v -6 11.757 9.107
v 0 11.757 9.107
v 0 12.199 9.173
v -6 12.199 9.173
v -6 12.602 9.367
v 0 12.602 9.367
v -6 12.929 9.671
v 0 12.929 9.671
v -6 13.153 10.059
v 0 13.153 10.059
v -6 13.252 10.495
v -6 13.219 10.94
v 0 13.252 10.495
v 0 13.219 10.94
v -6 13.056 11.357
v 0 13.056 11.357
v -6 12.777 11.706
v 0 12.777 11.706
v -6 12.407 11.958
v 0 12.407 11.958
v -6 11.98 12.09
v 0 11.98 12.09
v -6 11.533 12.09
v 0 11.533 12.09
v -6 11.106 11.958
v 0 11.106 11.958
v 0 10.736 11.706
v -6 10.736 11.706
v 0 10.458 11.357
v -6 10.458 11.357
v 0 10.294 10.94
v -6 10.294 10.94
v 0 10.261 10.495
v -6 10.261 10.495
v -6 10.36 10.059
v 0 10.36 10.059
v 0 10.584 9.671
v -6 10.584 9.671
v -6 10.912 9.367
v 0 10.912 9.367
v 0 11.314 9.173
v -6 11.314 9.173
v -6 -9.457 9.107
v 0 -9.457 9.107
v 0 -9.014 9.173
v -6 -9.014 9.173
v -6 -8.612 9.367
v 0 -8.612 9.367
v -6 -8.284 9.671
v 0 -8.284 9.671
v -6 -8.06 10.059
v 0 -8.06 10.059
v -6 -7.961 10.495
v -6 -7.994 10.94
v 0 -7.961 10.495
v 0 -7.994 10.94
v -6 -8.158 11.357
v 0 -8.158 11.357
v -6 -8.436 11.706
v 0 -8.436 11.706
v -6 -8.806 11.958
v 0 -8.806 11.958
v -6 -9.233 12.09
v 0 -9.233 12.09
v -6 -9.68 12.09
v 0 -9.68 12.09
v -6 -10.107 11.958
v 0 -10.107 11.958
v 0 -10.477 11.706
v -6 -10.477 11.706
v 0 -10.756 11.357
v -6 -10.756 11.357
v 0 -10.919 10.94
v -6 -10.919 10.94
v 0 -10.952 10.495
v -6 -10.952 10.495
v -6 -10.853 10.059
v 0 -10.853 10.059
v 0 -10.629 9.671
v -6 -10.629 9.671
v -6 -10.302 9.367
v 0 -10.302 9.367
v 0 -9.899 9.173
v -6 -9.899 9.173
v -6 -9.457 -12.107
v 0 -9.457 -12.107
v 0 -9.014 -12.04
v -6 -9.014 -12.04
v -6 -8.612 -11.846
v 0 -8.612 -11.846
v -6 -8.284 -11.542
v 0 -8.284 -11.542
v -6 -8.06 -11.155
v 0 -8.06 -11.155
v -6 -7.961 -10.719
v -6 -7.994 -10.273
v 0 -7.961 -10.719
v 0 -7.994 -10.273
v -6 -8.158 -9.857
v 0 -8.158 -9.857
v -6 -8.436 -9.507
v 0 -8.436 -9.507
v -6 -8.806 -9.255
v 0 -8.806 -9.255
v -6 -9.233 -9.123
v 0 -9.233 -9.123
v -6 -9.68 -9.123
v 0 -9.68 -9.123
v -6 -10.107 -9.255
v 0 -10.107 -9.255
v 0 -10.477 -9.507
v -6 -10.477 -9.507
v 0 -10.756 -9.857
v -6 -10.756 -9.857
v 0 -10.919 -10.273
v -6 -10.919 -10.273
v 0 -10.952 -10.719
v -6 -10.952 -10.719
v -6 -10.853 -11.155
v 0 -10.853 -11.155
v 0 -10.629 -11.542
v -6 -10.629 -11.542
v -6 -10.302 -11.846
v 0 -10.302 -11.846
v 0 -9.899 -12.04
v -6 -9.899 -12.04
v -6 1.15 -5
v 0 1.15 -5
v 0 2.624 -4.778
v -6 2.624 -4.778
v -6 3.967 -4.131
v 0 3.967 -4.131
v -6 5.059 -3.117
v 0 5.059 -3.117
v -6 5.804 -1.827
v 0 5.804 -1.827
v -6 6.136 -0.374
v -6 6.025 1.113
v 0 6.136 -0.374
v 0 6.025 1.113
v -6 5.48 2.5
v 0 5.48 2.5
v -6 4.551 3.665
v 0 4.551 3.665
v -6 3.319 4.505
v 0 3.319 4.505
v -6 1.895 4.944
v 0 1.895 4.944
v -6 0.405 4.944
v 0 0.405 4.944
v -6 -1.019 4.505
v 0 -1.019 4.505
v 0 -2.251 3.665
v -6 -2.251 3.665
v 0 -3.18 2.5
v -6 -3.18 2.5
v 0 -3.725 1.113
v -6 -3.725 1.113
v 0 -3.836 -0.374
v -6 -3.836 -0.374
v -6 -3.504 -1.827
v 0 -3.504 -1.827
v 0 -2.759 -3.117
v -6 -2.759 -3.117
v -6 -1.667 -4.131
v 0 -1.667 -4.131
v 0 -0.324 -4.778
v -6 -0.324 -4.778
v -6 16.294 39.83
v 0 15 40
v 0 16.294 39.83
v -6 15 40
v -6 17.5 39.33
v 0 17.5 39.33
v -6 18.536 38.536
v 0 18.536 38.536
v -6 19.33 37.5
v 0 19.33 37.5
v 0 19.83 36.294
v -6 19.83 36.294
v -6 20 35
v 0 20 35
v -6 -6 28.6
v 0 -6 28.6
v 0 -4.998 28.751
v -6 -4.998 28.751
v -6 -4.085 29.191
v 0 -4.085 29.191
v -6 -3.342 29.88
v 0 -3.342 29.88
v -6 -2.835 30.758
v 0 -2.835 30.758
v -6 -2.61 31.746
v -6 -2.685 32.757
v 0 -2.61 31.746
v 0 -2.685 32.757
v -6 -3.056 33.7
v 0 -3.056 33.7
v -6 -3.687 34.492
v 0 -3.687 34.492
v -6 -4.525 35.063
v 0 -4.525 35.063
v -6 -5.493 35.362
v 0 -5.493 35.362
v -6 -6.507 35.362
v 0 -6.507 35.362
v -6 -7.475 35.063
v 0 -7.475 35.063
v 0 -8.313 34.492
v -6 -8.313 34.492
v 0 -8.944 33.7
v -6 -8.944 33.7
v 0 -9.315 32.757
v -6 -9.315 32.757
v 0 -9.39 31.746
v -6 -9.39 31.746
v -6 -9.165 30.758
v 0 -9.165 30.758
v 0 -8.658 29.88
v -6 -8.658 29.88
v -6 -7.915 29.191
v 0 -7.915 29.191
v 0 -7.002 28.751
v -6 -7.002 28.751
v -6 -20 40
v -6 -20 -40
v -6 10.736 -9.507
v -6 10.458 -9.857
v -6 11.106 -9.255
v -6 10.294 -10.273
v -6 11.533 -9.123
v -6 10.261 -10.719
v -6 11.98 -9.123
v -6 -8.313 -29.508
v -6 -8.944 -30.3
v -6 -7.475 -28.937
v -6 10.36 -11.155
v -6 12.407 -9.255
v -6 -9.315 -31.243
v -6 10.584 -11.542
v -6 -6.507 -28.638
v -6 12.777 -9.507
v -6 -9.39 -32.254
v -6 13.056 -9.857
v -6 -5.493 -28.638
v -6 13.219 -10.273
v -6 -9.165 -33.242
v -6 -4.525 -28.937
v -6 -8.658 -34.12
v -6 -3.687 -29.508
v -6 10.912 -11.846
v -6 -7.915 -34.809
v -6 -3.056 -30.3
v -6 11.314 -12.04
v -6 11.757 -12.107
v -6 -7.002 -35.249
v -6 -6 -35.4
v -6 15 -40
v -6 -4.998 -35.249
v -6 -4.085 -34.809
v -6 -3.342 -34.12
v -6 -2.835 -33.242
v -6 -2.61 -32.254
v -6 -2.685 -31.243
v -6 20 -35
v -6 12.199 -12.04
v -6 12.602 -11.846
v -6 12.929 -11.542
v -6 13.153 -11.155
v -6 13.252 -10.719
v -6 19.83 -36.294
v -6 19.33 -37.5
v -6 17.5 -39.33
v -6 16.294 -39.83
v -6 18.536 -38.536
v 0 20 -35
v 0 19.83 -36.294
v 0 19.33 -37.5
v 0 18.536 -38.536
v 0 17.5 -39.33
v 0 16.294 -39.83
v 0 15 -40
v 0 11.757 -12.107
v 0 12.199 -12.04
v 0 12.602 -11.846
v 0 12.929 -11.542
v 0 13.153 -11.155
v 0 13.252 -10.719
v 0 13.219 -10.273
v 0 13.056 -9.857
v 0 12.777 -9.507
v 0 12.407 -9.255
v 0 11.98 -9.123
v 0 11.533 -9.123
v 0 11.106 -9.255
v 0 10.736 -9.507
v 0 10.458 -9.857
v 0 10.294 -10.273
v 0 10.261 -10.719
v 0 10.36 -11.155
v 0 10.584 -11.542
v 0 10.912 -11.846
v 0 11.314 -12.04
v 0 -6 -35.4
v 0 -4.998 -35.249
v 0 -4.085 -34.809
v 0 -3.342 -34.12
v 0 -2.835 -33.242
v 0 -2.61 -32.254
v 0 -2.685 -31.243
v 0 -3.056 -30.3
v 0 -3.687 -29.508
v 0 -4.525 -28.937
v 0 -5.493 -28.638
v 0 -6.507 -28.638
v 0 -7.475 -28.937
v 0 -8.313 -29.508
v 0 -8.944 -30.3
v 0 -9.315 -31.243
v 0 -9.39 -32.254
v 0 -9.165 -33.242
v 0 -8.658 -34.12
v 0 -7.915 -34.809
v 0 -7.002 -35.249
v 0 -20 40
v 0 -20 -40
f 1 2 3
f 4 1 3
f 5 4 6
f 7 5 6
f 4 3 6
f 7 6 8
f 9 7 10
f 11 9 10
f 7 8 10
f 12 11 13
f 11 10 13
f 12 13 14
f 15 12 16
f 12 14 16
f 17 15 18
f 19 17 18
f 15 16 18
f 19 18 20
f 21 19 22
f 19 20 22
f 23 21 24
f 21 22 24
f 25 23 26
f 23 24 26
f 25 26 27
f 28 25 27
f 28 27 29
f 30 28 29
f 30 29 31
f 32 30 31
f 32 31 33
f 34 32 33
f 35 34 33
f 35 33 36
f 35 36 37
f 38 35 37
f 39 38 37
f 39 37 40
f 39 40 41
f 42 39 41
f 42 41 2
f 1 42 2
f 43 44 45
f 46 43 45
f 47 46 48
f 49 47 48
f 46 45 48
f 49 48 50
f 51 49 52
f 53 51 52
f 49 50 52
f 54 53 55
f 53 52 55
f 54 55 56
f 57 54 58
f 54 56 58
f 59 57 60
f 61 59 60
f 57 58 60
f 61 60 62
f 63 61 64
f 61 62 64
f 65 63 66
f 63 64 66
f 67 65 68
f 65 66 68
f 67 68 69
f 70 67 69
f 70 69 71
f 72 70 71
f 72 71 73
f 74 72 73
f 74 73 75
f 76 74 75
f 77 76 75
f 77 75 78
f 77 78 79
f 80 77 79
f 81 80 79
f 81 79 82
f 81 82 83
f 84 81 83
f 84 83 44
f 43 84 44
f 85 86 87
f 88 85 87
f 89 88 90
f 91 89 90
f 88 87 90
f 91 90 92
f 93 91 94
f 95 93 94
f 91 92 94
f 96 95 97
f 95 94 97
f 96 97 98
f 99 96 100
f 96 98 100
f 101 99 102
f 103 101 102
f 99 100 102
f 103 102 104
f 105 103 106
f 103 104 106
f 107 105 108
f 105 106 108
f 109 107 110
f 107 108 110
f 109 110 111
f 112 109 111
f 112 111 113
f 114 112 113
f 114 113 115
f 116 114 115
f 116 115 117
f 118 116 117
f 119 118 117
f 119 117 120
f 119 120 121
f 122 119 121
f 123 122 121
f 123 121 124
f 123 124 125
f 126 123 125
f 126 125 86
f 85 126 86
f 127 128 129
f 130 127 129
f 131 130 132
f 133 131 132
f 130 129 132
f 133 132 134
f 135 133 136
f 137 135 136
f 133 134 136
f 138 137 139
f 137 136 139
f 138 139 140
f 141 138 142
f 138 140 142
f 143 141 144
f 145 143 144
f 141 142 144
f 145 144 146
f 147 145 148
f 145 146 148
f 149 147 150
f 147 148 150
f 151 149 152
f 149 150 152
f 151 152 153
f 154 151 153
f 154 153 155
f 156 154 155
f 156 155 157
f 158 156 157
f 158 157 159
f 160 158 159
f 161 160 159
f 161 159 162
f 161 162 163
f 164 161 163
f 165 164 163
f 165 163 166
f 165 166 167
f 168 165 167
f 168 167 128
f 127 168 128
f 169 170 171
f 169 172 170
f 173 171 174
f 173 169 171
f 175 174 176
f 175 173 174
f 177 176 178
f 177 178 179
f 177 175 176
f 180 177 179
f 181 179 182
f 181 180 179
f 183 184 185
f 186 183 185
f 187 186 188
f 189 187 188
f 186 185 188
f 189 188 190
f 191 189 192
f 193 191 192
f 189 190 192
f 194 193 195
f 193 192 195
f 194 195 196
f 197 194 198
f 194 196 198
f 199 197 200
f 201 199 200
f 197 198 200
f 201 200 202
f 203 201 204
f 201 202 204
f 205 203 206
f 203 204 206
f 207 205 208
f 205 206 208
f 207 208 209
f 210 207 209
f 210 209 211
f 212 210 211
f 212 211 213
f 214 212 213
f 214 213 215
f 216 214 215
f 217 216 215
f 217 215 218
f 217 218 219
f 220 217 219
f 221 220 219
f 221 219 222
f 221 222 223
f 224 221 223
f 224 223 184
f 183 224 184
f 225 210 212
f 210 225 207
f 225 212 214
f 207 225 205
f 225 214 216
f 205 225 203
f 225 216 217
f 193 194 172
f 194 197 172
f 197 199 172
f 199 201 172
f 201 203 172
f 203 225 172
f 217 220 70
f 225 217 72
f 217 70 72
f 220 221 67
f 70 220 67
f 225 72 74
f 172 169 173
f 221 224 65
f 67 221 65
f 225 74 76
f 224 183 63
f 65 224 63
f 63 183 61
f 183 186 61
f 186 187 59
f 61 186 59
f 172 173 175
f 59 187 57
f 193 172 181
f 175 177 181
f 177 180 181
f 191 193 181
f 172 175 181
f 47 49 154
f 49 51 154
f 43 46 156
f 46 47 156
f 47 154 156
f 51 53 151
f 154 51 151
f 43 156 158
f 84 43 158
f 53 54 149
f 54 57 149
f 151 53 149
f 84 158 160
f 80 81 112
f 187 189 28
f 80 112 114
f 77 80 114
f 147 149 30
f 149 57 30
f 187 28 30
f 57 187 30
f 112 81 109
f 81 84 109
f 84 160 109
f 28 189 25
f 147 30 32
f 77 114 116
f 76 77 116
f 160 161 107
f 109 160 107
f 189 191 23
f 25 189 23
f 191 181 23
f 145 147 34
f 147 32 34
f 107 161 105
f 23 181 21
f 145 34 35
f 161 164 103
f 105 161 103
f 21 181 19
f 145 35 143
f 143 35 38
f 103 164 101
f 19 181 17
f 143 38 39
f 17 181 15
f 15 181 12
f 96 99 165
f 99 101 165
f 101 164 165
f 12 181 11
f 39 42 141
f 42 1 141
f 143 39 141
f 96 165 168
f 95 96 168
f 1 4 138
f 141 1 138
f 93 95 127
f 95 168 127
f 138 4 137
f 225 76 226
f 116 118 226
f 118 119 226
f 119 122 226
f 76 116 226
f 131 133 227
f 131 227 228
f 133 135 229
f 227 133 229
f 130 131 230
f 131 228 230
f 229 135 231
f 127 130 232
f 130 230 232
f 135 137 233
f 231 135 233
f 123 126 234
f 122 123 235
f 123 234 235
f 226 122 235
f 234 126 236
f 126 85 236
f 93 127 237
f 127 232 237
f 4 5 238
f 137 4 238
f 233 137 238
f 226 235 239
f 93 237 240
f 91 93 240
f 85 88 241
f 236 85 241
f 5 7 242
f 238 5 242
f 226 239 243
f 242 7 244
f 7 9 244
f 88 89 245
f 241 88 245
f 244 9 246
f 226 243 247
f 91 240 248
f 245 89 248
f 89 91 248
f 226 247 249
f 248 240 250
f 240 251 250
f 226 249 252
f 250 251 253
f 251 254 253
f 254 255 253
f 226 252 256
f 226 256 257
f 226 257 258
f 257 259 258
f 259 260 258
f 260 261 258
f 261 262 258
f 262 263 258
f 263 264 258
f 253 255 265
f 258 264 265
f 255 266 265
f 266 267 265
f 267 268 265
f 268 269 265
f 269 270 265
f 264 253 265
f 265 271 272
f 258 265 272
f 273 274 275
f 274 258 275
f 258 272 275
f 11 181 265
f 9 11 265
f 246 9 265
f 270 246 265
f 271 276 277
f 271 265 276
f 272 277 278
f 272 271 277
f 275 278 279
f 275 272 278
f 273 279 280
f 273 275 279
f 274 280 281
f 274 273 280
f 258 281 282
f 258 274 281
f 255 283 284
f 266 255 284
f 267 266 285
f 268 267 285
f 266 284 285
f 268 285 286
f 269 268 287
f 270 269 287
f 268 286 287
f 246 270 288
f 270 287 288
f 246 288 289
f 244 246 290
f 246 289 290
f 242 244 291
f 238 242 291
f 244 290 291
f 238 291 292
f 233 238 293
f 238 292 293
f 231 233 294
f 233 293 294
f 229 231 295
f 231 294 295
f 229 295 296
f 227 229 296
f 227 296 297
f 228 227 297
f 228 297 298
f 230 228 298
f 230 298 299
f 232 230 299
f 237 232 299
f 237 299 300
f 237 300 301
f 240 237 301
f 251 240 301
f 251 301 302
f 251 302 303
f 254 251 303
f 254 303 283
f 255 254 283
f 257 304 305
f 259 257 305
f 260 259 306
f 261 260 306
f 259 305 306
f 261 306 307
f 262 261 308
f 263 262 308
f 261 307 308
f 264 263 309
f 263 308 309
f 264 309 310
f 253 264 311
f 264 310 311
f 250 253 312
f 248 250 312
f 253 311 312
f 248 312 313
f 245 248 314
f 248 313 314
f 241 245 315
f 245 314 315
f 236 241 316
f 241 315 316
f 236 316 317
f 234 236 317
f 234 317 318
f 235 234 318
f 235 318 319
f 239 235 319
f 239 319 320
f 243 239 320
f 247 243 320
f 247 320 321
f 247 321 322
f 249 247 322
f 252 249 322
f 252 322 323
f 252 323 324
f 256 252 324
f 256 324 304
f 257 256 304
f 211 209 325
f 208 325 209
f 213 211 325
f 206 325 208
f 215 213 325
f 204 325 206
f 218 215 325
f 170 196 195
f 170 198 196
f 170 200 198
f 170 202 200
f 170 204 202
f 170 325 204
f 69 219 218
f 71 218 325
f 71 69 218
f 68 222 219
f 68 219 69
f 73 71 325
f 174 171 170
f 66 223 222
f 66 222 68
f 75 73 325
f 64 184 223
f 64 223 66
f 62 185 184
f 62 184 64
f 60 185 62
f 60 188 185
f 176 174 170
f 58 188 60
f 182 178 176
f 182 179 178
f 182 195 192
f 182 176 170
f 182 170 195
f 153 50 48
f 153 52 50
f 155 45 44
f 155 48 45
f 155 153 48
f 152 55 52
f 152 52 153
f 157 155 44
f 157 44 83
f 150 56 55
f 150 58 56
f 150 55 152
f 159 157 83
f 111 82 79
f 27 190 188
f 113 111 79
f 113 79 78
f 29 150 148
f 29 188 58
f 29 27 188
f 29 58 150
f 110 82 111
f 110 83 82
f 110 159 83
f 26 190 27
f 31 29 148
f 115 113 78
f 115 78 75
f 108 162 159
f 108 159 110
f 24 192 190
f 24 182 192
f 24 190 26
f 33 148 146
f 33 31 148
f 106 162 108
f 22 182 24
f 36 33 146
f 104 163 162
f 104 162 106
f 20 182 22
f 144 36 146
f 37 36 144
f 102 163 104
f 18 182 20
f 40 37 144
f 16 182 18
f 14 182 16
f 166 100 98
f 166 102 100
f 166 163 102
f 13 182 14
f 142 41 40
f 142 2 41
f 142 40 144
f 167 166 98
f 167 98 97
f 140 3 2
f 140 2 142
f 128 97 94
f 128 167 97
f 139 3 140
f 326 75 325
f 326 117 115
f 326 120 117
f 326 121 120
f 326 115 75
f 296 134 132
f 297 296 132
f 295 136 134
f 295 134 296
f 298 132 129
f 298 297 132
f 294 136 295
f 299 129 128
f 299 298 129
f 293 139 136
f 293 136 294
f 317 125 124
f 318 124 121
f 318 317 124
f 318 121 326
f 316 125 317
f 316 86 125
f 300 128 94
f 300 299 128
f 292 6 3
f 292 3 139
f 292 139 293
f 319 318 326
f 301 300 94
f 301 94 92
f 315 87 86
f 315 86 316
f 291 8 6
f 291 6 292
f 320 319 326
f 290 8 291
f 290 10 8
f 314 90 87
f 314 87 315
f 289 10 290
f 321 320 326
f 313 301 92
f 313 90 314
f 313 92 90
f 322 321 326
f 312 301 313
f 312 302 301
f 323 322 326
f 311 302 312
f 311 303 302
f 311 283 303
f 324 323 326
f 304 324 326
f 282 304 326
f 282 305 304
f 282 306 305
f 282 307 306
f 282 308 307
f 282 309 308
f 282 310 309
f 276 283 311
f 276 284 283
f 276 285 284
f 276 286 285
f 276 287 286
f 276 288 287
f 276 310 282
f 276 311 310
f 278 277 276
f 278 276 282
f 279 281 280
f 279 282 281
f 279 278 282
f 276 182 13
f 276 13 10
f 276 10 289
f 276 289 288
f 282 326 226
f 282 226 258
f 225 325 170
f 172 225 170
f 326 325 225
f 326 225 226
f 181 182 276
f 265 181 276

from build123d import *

# Parameters (mm, degrees)
SKETCH3_W           = 80
SKETCH3_H           = 40
BOSS_EXTRUDE3_DEPTH = 6
SKETCH4_R           = 5
SKETCH4_R_2         = 1.5
SKETCH4_R_3         = 3.4
CUT_EXTRUDE1_DEPTH  = 8
FILLET1_R           = 5


with BuildPart() as part:
    # Sketch3 → Boss-Extrude3 (new body)
    with BuildSketch(Plane(origin=(0, 0, 0), x_dir=(0, 0, -1), z_dir=(1, 0, 0))):
        Rectangle(SKETCH3_W, SKETCH3_H)
    extrude(amount=-BOSS_EXTRUDE3_DEPTH)

    # Sketch4 → Cut-Extrude1 (cut)
    with BuildSketch(Plane(origin=(0, 0, 0), x_dir=(0, 0, -1), z_dir=(1, 0, 0))):
        with Locations((0, 1.15)):
            Circle(SKETCH4_R)
        with Locations((-10.606601718, 11.756601718)):
            Circle(SKETCH4_R_2)
        with Locations((10.606601718, 11.756601718)):
            Circle(SKETCH4_R_2)
        with Locations((10.606601718, -9.456601718)):
            Circle(SKETCH4_R_2)
        with Locations((-10.606601718, -9.456601718)):
            Circle(SKETCH4_R_2)
        with Locations((32, -6)):
            Circle(SKETCH4_R_3)
        with Locations((-32, -6)):
            Circle(SKETCH4_R_3)
    extrude(amount=-CUT_EXTRUDE1_DEPTH, mode=Mode.SUBTRACT)

    # Fillet1
    fillet1_edges = [part.edges().sort_by_distance(p)[0] for p in [
        (-3, 20, 40),
        (-3, 20, -40),
    ]]
    fillet(fillet1_edges, radius=FILLET1_R)


solid = part.part
